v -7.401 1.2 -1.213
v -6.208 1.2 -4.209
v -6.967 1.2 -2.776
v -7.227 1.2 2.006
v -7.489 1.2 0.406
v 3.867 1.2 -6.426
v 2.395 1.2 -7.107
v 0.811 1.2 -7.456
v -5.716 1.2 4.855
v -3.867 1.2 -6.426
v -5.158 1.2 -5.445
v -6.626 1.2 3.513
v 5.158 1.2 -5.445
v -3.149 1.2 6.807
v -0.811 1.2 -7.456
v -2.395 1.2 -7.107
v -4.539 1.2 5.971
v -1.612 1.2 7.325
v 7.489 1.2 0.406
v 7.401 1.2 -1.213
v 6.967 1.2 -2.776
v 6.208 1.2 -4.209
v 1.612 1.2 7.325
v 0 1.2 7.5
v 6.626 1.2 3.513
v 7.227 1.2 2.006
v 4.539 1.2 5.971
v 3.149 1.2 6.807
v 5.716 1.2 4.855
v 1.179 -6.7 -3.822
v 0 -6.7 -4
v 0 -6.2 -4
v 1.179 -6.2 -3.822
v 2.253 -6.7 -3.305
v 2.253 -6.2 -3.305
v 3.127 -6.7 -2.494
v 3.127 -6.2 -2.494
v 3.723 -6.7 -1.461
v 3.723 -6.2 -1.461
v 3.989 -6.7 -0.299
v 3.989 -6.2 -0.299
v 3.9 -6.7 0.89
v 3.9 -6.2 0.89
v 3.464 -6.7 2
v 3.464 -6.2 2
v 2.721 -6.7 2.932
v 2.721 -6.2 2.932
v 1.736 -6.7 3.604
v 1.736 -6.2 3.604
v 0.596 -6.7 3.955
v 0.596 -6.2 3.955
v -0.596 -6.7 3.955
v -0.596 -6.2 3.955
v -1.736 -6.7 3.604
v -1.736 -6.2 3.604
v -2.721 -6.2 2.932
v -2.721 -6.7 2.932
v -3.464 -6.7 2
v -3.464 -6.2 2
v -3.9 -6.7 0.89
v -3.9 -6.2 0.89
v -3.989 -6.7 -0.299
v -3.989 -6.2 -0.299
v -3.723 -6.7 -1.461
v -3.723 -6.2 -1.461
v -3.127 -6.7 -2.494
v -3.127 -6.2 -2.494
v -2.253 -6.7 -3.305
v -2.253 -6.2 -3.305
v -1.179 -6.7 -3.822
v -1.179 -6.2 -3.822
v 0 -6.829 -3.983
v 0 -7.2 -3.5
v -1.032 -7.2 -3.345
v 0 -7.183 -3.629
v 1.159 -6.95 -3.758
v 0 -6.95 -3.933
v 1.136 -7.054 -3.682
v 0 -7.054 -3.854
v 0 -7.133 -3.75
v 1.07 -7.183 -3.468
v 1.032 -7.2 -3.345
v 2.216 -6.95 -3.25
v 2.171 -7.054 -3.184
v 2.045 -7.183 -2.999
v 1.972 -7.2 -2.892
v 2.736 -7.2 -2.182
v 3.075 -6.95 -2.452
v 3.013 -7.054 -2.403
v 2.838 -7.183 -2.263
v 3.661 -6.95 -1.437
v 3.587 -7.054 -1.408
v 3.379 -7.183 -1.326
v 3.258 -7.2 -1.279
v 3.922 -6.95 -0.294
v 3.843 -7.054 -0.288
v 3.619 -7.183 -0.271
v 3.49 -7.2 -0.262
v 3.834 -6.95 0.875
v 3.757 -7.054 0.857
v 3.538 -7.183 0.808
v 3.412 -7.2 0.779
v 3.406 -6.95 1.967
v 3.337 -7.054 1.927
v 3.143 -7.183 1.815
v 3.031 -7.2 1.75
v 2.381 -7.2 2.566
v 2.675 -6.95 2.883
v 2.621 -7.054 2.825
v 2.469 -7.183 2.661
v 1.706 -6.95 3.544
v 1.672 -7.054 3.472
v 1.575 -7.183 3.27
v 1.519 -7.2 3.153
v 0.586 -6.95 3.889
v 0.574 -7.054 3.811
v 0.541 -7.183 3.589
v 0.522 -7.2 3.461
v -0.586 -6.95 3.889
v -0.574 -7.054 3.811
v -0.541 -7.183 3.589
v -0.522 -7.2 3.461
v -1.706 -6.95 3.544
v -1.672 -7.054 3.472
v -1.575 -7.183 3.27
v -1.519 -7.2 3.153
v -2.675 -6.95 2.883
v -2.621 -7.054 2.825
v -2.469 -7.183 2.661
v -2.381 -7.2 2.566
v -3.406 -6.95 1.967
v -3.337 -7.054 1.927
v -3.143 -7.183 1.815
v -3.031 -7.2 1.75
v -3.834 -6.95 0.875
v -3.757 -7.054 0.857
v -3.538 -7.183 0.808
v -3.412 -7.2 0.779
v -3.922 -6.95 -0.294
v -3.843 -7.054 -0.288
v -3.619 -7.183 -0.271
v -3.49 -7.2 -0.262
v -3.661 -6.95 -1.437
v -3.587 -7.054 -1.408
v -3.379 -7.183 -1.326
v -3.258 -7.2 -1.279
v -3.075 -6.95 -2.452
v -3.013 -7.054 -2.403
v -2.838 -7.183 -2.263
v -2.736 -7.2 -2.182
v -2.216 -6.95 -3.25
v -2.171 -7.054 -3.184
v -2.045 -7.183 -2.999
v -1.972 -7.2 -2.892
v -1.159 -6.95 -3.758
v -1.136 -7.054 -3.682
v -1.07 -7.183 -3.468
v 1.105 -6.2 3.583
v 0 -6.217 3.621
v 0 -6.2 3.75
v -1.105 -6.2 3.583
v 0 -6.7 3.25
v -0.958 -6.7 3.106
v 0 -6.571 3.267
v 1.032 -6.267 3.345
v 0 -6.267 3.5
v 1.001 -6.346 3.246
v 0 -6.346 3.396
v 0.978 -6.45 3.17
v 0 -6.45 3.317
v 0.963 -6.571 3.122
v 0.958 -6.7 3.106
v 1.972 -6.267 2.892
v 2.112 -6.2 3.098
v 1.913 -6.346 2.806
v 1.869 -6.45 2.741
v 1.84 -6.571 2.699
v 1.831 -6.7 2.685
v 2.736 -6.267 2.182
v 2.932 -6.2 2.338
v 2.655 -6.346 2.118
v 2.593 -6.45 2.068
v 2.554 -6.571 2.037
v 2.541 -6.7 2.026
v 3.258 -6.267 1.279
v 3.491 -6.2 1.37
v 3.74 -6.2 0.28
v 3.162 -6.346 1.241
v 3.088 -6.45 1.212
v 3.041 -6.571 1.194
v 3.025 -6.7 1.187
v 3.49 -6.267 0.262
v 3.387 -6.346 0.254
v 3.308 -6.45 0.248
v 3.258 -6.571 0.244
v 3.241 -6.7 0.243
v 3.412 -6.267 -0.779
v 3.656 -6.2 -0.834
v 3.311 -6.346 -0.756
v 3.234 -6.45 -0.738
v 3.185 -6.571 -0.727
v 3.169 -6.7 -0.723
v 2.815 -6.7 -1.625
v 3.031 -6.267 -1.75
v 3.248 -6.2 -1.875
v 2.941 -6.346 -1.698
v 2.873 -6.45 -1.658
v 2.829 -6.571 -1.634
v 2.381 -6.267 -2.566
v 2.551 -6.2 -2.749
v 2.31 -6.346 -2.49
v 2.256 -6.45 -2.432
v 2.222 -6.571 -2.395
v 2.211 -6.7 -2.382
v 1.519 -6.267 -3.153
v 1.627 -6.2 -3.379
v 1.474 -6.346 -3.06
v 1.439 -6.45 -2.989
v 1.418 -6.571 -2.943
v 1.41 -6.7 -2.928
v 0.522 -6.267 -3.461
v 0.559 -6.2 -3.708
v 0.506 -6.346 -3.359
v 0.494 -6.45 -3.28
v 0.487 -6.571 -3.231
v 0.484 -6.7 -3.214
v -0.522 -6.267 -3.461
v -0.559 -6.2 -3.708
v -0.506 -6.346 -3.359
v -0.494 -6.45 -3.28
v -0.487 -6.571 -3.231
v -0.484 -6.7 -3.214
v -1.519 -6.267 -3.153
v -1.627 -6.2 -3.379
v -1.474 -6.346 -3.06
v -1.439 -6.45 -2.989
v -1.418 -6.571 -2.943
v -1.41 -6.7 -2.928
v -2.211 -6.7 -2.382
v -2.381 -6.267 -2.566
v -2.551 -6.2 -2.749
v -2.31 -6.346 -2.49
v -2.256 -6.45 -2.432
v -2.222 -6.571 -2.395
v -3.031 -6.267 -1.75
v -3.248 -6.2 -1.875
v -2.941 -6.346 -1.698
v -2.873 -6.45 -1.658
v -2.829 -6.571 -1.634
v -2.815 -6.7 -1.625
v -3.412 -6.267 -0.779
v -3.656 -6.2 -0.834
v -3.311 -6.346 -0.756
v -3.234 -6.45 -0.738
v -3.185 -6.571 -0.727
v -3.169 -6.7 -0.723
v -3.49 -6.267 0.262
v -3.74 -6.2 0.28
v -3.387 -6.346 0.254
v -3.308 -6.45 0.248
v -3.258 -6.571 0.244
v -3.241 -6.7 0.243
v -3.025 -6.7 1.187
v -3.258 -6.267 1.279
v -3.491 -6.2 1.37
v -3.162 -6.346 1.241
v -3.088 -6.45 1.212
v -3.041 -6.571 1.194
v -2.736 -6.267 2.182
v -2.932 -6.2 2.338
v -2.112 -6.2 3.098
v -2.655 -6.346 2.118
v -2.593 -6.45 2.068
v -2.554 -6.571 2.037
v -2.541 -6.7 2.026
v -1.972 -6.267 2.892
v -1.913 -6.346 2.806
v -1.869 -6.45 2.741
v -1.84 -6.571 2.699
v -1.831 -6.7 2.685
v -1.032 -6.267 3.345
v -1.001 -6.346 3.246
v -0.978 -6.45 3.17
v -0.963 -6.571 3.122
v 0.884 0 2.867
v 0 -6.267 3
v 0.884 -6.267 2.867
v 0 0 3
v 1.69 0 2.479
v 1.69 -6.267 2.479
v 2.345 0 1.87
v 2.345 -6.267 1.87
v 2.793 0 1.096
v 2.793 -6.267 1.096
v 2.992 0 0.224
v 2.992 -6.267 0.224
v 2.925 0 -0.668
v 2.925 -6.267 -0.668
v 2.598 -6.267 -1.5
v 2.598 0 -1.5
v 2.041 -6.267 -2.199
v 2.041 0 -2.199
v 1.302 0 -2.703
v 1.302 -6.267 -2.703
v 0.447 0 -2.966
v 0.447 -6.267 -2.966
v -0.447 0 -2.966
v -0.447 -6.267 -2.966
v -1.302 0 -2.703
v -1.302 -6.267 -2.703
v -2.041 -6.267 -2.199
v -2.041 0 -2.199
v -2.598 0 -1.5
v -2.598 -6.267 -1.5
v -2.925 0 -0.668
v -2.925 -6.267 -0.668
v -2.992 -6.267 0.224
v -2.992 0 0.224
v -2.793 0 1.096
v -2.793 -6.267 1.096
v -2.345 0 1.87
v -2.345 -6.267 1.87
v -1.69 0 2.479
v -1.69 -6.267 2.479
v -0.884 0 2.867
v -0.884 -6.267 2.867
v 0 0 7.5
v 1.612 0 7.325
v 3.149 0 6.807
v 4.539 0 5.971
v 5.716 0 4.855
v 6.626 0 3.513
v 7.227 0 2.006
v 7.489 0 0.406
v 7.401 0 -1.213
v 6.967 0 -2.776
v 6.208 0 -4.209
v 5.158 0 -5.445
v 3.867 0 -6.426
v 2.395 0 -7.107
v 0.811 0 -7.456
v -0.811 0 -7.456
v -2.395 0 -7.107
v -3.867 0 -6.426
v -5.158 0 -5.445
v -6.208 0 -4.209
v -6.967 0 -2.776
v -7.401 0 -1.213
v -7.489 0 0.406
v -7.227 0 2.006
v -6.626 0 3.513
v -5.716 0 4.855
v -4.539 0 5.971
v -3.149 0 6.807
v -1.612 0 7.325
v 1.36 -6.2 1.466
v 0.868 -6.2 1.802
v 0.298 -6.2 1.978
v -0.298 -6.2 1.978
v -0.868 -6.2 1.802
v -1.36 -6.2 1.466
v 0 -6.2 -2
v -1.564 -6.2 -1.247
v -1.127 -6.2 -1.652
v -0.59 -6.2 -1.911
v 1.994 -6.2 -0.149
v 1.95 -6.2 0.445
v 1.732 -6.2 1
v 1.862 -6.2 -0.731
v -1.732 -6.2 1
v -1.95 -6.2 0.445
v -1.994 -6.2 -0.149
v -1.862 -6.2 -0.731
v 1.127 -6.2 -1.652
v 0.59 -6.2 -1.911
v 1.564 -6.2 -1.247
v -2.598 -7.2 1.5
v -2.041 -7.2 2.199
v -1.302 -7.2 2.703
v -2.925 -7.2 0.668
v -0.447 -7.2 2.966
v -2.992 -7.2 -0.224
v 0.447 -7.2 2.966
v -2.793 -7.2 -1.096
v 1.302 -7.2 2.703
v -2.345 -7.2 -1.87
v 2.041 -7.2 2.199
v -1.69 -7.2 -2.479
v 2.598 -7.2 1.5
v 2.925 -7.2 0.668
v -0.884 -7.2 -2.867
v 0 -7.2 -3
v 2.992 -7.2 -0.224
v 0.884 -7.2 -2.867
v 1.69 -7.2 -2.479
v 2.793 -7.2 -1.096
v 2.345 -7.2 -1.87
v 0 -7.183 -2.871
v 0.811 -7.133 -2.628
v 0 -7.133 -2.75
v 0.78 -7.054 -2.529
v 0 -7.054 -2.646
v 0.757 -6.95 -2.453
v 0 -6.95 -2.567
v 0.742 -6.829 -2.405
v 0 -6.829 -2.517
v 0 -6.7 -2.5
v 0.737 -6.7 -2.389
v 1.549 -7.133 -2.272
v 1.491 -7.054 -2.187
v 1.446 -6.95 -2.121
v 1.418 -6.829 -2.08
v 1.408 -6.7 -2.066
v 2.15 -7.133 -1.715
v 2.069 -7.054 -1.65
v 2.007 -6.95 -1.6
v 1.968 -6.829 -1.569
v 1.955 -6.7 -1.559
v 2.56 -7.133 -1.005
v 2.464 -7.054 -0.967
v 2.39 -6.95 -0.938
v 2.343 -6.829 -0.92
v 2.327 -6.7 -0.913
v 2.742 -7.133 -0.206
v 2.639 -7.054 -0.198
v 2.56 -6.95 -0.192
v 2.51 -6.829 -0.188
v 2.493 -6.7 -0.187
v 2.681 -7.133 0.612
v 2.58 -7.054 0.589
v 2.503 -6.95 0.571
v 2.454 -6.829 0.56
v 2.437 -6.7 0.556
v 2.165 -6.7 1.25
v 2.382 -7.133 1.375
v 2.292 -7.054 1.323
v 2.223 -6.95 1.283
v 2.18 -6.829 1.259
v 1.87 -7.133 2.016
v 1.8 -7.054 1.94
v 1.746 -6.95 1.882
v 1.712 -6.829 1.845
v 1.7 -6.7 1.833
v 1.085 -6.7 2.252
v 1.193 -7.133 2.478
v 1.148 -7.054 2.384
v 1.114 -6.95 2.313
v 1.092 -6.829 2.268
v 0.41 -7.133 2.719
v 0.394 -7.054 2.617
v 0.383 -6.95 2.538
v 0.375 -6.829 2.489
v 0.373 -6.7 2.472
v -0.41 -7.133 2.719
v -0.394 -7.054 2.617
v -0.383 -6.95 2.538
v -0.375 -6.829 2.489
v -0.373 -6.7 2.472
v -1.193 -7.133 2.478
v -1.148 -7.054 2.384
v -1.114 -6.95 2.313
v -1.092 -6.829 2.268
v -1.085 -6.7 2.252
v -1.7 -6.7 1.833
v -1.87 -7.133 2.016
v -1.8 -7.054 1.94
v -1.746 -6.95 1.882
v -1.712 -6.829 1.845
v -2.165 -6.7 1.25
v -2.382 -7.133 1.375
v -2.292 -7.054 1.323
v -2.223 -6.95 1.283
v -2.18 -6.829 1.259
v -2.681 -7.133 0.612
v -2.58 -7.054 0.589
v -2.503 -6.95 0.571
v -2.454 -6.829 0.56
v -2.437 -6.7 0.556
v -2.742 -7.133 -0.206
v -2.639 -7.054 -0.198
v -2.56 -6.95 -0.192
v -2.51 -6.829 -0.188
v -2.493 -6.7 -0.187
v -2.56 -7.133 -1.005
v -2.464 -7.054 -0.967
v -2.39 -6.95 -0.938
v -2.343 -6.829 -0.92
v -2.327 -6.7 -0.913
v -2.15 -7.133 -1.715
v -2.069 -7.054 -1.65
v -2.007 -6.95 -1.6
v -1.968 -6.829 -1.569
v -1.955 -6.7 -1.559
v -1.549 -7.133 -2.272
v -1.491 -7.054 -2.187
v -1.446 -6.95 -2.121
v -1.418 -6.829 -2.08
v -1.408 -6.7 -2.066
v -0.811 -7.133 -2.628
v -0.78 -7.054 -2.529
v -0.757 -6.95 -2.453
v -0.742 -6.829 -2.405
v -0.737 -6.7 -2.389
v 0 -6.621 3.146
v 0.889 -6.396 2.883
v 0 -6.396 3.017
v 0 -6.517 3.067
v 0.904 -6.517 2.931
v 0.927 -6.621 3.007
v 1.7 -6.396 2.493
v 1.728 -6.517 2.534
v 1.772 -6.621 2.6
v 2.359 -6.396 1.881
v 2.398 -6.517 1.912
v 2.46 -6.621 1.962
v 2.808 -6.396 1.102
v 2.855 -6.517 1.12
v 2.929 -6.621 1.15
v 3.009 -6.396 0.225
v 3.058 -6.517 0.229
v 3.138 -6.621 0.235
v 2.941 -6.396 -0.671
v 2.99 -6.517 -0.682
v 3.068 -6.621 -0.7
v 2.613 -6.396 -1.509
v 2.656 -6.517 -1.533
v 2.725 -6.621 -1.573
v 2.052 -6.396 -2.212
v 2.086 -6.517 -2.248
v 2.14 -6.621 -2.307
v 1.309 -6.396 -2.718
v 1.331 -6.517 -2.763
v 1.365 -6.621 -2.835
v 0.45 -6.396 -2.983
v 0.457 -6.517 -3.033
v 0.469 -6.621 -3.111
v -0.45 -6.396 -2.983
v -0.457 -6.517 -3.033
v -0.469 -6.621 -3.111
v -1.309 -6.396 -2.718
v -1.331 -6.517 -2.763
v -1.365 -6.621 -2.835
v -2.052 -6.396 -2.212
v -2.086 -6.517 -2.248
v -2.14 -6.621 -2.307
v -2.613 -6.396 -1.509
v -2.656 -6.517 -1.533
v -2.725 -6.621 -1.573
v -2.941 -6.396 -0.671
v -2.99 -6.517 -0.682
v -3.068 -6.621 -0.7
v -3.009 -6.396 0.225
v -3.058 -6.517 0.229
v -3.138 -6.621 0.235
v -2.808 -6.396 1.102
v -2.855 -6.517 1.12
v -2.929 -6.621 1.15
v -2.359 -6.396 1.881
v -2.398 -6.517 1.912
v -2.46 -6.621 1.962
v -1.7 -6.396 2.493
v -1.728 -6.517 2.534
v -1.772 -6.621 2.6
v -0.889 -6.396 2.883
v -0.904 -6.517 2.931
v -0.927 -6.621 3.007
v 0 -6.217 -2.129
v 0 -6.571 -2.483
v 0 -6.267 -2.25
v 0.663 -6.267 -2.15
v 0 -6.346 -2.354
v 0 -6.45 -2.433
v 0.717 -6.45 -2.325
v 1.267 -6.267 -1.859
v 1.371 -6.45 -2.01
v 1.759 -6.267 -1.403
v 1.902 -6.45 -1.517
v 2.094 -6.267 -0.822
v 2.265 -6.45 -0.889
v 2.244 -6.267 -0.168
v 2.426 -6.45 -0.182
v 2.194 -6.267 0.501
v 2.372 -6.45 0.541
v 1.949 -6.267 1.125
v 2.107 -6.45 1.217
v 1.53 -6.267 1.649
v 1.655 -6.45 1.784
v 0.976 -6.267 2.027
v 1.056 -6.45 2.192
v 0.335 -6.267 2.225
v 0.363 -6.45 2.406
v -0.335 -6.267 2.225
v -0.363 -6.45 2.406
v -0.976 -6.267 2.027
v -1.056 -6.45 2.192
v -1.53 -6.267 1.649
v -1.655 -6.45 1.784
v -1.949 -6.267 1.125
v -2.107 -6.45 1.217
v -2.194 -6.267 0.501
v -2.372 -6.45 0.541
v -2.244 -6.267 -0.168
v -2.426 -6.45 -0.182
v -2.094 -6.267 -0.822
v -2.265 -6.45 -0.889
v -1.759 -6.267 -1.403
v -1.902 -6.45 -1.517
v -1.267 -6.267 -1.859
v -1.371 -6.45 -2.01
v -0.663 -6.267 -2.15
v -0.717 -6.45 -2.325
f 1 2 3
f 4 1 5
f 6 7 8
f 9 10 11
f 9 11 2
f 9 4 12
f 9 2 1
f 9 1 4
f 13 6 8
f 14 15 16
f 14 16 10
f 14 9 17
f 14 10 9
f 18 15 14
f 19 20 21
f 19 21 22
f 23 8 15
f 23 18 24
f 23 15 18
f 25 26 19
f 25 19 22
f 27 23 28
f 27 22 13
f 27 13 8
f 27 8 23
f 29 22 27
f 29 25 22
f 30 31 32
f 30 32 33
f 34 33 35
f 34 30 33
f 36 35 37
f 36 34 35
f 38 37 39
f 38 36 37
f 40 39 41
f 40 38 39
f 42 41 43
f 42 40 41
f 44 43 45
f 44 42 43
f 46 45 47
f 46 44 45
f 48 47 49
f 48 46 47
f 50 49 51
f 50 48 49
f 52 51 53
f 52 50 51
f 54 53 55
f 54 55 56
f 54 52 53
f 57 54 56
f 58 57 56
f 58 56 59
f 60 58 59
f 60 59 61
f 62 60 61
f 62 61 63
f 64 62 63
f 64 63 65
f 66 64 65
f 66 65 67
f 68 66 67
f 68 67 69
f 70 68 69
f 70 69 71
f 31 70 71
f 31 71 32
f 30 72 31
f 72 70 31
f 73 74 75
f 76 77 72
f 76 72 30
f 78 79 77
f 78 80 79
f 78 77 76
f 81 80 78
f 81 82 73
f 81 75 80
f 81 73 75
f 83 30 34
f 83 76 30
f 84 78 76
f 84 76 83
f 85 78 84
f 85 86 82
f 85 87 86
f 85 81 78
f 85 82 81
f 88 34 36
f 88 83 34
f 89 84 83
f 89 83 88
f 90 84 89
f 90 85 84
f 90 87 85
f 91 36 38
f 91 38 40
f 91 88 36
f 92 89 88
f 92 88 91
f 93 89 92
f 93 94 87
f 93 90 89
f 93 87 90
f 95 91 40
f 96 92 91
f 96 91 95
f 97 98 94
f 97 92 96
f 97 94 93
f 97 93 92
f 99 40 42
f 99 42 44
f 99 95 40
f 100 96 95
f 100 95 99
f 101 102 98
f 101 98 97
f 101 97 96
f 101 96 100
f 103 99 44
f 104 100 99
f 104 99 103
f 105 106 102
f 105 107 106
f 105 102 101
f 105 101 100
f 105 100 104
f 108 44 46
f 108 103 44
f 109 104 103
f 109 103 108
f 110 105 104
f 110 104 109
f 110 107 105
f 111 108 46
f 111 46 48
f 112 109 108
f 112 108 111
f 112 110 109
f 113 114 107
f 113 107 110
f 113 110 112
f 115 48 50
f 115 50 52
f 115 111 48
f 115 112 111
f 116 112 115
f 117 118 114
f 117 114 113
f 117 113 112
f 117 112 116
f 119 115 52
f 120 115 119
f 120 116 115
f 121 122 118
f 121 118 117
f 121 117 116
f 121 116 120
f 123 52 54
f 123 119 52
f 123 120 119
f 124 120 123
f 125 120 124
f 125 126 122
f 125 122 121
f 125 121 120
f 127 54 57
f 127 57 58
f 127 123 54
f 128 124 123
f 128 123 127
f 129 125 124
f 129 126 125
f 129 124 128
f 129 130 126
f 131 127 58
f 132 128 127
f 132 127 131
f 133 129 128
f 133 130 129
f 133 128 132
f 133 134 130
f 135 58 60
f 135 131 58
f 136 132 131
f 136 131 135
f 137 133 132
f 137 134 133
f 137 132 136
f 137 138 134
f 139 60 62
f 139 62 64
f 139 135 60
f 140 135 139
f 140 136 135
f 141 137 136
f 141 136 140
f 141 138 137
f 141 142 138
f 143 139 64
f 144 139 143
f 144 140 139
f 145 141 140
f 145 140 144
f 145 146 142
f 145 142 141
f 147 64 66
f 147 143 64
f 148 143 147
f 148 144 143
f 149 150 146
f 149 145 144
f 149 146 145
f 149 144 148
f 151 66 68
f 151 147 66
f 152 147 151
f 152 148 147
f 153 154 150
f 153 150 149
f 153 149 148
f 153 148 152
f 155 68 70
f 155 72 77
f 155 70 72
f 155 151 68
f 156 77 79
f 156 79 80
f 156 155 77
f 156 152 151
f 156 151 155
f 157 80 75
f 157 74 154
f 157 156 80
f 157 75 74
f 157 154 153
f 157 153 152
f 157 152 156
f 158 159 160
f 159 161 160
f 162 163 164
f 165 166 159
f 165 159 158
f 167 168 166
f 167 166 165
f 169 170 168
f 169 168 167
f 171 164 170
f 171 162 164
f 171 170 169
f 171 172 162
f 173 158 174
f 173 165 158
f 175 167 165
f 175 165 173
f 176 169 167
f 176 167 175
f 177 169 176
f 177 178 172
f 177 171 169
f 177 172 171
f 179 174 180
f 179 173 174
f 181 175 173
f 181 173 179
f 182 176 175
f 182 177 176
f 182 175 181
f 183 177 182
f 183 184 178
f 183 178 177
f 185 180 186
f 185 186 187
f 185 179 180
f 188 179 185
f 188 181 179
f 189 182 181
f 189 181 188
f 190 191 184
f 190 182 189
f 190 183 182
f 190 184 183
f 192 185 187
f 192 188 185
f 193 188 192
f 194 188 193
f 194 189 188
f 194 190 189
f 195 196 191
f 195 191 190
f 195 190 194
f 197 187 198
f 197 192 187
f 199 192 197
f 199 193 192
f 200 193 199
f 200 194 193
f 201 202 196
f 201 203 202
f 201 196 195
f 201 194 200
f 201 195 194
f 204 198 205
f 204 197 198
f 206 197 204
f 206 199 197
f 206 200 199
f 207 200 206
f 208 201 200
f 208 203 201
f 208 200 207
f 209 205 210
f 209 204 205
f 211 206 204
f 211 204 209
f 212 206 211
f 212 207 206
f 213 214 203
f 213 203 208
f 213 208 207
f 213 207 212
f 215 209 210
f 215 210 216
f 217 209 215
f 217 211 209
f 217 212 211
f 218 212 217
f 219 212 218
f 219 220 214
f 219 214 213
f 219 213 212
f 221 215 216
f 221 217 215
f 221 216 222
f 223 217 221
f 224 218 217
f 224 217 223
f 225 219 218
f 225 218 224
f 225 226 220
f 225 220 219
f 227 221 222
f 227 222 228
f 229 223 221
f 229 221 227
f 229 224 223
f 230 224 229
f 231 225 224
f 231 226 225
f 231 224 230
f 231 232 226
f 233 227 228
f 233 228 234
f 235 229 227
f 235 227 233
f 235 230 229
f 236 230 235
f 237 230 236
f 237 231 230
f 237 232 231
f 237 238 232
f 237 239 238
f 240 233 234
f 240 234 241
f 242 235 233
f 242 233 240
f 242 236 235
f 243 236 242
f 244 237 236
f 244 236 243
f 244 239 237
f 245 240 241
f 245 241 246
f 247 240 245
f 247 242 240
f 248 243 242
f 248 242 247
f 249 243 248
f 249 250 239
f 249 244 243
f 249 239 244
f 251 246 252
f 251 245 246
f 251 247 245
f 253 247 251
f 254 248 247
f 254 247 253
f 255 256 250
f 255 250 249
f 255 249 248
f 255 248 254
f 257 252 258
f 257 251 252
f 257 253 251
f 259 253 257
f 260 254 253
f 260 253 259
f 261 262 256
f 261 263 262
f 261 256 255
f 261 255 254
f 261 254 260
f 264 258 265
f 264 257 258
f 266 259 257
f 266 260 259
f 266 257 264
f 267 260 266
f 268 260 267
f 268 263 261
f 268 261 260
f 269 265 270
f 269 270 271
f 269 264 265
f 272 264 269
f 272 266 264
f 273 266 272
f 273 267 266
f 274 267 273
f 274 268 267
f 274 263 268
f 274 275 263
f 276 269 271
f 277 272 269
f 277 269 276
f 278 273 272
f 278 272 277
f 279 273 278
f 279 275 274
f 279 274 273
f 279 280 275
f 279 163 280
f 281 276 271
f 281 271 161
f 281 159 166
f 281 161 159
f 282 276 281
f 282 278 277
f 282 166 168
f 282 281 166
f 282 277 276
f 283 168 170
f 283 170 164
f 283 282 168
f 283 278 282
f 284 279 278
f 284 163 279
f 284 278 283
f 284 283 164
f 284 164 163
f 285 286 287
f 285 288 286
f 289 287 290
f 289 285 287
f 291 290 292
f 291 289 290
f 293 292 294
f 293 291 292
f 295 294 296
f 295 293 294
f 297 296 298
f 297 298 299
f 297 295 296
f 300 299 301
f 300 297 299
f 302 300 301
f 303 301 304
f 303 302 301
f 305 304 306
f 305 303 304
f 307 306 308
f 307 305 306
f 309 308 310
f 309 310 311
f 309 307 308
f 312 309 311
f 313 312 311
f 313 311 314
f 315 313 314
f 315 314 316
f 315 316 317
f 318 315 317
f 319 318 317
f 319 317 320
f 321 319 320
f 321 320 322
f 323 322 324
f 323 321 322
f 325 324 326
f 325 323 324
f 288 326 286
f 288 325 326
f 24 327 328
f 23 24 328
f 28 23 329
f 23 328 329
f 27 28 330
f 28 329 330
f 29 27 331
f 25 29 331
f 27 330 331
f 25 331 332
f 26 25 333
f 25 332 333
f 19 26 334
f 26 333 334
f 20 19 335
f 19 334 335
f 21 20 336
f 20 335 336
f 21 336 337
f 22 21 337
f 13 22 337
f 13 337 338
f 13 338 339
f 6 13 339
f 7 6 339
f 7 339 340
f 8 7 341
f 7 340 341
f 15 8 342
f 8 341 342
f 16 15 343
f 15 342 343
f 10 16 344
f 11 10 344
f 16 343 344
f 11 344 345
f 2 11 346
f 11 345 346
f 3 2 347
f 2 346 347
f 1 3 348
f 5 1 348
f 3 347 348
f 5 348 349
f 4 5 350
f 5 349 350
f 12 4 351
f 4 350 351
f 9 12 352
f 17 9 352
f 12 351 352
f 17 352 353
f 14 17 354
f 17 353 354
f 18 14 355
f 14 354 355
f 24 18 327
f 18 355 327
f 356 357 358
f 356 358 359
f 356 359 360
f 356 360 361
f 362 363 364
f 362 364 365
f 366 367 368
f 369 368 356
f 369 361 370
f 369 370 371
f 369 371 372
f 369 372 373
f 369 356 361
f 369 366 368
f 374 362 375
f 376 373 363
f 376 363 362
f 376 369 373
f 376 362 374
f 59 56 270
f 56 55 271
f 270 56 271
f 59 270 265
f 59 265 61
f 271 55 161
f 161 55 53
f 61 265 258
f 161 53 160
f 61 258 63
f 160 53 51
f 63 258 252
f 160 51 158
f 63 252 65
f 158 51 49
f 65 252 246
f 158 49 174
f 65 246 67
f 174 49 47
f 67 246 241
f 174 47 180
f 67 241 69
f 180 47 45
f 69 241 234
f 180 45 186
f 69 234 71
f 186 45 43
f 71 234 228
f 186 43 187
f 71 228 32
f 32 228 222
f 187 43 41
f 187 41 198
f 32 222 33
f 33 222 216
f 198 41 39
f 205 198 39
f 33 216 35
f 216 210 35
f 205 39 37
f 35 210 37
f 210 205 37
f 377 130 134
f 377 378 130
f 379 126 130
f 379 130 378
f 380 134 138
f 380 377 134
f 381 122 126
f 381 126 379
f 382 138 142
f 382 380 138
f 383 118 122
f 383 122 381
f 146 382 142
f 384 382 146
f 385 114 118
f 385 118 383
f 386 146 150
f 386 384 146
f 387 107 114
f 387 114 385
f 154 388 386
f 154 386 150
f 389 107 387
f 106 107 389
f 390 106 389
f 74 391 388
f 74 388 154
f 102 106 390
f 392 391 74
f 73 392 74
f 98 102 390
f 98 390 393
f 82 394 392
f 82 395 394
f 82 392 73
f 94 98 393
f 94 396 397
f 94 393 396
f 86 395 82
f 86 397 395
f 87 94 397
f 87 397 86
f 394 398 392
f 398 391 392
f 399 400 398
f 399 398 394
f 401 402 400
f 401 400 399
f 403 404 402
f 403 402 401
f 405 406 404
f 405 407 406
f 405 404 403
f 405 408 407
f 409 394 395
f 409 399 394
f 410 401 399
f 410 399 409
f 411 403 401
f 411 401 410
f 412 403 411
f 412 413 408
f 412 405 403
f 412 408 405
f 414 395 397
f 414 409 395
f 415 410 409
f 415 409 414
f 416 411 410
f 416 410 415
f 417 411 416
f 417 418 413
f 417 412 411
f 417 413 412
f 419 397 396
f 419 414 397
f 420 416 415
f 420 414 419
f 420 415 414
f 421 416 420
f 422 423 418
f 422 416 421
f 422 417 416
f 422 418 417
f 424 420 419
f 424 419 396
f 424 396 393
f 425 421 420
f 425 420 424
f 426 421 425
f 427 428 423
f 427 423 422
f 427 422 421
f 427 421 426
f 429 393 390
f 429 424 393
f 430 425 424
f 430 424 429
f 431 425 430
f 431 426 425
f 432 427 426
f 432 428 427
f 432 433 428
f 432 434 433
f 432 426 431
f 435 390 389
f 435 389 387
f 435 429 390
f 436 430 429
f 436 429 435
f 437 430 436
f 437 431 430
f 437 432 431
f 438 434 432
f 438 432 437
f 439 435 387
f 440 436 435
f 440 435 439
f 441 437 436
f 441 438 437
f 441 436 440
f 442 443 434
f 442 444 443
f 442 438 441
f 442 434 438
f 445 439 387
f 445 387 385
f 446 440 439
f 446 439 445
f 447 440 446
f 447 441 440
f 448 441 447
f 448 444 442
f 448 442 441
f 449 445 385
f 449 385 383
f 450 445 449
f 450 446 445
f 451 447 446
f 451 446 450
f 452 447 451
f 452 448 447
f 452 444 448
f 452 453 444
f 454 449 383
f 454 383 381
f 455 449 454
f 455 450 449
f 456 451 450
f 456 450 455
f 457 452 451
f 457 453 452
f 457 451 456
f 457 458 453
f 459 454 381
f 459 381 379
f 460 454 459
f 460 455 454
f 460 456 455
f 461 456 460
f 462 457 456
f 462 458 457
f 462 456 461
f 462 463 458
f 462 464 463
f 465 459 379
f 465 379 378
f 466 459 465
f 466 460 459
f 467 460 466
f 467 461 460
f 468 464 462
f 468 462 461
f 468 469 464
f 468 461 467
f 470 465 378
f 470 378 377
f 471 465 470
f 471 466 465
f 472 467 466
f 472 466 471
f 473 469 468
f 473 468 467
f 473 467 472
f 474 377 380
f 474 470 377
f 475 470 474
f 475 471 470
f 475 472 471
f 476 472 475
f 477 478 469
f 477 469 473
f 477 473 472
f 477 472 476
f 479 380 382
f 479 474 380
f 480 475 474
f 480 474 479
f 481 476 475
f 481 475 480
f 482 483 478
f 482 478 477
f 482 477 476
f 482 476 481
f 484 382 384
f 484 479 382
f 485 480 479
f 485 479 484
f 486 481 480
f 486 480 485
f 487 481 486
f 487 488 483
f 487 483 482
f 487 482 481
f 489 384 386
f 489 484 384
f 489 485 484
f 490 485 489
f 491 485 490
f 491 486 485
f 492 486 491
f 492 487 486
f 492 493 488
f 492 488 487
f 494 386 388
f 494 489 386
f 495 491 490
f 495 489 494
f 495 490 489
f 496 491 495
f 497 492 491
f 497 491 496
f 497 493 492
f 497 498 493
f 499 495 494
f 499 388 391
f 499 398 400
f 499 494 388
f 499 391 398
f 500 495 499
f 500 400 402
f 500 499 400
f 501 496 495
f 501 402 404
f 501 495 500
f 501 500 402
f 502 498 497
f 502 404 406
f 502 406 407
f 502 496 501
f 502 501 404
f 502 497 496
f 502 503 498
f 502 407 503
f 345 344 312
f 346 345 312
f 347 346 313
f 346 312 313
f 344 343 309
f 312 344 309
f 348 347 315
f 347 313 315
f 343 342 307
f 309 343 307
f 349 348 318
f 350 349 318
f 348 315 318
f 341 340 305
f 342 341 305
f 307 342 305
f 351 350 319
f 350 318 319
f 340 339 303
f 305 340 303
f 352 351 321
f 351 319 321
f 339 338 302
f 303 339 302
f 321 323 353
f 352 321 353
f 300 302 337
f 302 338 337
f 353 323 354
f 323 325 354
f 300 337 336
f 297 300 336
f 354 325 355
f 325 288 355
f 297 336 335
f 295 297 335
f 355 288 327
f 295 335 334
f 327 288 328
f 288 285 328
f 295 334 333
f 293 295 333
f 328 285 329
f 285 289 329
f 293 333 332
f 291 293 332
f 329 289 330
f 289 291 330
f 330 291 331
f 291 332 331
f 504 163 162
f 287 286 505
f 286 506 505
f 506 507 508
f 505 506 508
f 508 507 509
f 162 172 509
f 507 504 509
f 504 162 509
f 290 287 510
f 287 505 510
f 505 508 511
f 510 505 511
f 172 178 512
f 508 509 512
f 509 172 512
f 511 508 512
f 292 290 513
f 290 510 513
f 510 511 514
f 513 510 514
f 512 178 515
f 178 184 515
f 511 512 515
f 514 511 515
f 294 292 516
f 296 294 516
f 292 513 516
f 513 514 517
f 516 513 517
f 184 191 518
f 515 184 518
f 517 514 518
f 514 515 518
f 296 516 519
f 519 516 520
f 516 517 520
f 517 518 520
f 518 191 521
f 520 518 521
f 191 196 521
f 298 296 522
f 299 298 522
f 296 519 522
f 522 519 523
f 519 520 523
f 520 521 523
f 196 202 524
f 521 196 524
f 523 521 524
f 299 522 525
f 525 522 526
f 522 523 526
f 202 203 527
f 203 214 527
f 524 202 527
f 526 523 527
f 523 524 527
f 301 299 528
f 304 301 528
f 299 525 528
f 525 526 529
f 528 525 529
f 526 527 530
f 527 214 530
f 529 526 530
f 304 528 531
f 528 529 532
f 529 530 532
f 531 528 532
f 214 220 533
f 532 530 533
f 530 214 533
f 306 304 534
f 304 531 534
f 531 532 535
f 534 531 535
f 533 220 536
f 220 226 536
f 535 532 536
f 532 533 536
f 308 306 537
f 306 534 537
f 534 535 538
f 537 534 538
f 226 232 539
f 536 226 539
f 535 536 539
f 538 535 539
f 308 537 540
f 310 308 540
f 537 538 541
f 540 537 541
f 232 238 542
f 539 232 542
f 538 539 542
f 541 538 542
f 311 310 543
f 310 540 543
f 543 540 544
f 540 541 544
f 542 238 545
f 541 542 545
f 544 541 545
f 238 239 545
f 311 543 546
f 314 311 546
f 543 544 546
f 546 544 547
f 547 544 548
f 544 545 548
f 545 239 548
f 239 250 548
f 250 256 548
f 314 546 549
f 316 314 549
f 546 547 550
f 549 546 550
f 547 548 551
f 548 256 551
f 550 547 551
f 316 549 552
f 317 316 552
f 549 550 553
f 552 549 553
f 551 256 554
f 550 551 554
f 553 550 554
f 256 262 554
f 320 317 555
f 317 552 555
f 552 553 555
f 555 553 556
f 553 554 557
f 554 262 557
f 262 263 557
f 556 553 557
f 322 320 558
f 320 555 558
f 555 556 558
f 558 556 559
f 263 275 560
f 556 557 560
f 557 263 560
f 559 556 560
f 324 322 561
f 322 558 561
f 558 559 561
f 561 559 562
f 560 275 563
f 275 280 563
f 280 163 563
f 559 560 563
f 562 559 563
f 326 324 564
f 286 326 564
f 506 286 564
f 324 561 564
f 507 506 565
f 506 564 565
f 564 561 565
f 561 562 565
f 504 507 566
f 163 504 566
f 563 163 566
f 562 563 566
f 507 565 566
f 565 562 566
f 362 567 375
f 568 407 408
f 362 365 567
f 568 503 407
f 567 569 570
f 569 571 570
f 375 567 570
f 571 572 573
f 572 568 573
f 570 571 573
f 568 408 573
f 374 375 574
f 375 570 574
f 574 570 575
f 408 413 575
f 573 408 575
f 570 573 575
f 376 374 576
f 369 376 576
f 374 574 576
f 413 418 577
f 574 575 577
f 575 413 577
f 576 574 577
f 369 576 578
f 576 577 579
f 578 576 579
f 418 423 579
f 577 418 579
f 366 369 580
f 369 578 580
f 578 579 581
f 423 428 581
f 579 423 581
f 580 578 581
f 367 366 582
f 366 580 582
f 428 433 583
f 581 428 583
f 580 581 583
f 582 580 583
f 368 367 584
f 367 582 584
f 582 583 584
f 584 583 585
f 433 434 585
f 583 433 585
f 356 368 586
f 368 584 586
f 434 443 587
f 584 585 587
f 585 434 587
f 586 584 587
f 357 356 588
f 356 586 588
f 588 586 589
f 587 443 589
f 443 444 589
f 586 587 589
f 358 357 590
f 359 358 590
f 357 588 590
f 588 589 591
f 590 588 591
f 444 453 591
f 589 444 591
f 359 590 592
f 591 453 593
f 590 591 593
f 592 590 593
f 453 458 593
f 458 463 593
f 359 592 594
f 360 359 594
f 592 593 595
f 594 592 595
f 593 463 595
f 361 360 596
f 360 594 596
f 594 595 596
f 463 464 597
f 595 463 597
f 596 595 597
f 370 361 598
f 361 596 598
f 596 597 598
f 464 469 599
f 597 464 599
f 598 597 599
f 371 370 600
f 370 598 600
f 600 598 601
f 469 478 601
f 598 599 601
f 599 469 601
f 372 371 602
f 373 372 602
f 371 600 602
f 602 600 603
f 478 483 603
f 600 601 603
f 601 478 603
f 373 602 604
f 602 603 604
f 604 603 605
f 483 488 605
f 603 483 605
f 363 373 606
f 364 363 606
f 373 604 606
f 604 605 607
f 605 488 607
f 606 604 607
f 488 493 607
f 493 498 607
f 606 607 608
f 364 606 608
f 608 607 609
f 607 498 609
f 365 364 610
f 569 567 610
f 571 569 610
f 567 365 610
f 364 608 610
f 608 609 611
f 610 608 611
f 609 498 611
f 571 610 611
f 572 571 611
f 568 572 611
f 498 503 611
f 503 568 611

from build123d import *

# Parameters (mm, degrees)
ESBO_O1_R                = 7.5
RESSALTO_EXTRUS_O1_DEPTH = 1.2
ESBO_O2_R                = 3
RESSALTO_EXTRUS_O2_DEPTH = 7.2
ESBO_O3_R                = 4
RESSALTO_EXTRUS_O3_DEPTH = 1
ESBO_O4_R                = 3.25
ESBO_O4_R_2              = 3.0000000000000004
CORTE_EXTRUS_O1_DEPTH    = 0.5
ESBO_O5_R                = 2.5
CORTE_EXTRUS_O4_DEPTH    = 1
FILETE1_R                = 0.5


with BuildPart() as part:
    # Esboço1 → Ressalto-extrusão1 (new body)
    with BuildSketch(Plane(origin=(0, 0, 0), x_dir=(1, 0, 0), z_dir=(0, 1, 0))):
        with Locations(Location((0, 0, 0), (0, 0, 270))):
            Circle(ESBO_O1_R)
    extrude(amount=RESSALTO_EXTRUS_O1_DEPTH)

    # Esboço2 → Ressalto-extrusão2 (add)
    with BuildSketch(Plane.XZ):
        with Locations(Location((0, 0, 0), (0, 0, 90))):
            Circle(ESBO_O2_R)
    extrude(amount=RESSALTO_EXTRUS_O2_DEPTH)

    # Esboço3 → Ressalto-extrusão3 (add)
    with BuildSketch(Plane.XZ.offset(7.2)):
        with Locations(Location((0, 0, 0), (0, 0, 270))):
            Circle(ESBO_O3_R)
    extrude(amount=-RESSALTO_EXTRUS_O3_DEPTH)

    # Esboço4 → Corte-extrusão1 (cut)
    with BuildSketch(Plane(origin=(0, -6.2, 0), x_dir=(1, 0, 0), z_dir=(0, 1, 0))):
        with Locations(Location((0, 0, 0), (0, 0, 270))):
            Circle(ESBO_O4_R)
        with Locations(Location((0, 0, 0), (0, 0, 270))):
            Circle(ESBO_O4_R_2, mode=Mode.SUBTRACT)
    extrude(amount=-CORTE_EXTRUS_O1_DEPTH, mode=Mode.SUBTRACT)

    # Esboço5 → Corte-extrusão4 (cut)
    with BuildSketch(Plane.XZ.offset(7.2)):
        with Locations(Location((0, 0, 0), (0, 0, 270))):
            Circle(ESBO_O5_R)
    extrude(amount=-CORTE_EXTRUS_O4_DEPTH, mode=Mode.SUBTRACT)

    # Filete1
    # the kernel refuses this fillet: 0.5 mm, written as the material it adds along each edge
    with BuildSketch(Plane(origin=(0, -6.7, 0), x_dir=(-1.8e-16, 0, 1), z_dir=(-1, 0, -1.8e-16))) as filete1_piece_1:
        with BuildLine():
            CenterArc((3.5000000000000004, 0.4330127018922436), FILETE1_R, 180, 60.000000000001364)
            Line((3.2500000000000107, 1.865e-14), (3.0000000000000004, 0))
            Line((3.0000000000000004, 0), (3.0000000000000004, 0.4330127018922436))
        make_face()
    revolve(axis=Axis((0, -6.7, 0), (0, 1, 0)))
    with BuildSketch(Plane(origin=(0, -6.2, 0), x_dir=(-1.8e-16, 0, -1), z_dir=(-1, 0, 1.8e-16))) as filete1_piece_2:
        with BuildLine():
            CenterArc((2.5 - FILETE1_R, FILETE1_R), FILETE1_R, 270, 90)
            Line((2.5 - FILETE1_R, 0), (2.5, 0))
            Line((2.5, 0), (2.5, FILETE1_R))
        make_face()
    revolve(axis=Axis((0, -6.2, 0), (0, -1, 0)))
    # the kernel refuses this fillet: 0.5 mm, written as the material it takes off along each edge
    with BuildSketch(Plane(origin=(0, -7.2, 0), x_dir=(-1.8e-16, 0, -1), z_dir=(-1, 0, 1.8e-16))) as filete1_2_piece_1:
        with BuildLine():
            CenterArc((4 - FILETE1_R, -FILETE1_R), FILETE1_R, 0, 90)
            Line((4 - FILETE1_R, 0), (4, 0))
            Line((4, 0), (4, -FILETE1_R))
        make_face()
    revolve(axis=Axis((0, -7.2, 0), (0, -1, 0)), mode=Mode.SUBTRACT)
    with BuildSketch(Plane(origin=(0, -6.2, 0), x_dir=(-1.8e-16, 0, 1), z_dir=(-1, 0, -1.8e-16))) as filete1_2_piece_2:
        with BuildLine():
            CenterArc((3.25 + FILETE1_R, -FILETE1_R), FILETE1_R, 90, 90)
            Line((3.25 + FILETE1_R, 0), (3.25, 0))
            Line((3.25, 0), (3.25, -FILETE1_R))
        make_face()
    revolve(axis=Axis((0, -6.2, 0), (0, 1, 0)), mode=Mode.SUBTRACT)
    with BuildSketch(Plane(origin=(0, -7.2, 0), x_dir=(-1.8e-16, 0, -1), z_dir=(-1, 0, 1.8e-16))) as filete1_2_piece_3:
        with BuildLine():
            CenterArc((2.5 + FILETE1_R, -FILETE1_R), FILETE1_R, 90, 90)
            Line((2.5, -FILETE1_R), (2.5, 0))
            Line((2.5, 0), (2.5 + FILETE1_R, 0))
        make_face()
    revolve(axis=Axis((0, -7.2, 0), (0, -1, 0)), mode=Mode.SUBTRACT)


solid = part.part
